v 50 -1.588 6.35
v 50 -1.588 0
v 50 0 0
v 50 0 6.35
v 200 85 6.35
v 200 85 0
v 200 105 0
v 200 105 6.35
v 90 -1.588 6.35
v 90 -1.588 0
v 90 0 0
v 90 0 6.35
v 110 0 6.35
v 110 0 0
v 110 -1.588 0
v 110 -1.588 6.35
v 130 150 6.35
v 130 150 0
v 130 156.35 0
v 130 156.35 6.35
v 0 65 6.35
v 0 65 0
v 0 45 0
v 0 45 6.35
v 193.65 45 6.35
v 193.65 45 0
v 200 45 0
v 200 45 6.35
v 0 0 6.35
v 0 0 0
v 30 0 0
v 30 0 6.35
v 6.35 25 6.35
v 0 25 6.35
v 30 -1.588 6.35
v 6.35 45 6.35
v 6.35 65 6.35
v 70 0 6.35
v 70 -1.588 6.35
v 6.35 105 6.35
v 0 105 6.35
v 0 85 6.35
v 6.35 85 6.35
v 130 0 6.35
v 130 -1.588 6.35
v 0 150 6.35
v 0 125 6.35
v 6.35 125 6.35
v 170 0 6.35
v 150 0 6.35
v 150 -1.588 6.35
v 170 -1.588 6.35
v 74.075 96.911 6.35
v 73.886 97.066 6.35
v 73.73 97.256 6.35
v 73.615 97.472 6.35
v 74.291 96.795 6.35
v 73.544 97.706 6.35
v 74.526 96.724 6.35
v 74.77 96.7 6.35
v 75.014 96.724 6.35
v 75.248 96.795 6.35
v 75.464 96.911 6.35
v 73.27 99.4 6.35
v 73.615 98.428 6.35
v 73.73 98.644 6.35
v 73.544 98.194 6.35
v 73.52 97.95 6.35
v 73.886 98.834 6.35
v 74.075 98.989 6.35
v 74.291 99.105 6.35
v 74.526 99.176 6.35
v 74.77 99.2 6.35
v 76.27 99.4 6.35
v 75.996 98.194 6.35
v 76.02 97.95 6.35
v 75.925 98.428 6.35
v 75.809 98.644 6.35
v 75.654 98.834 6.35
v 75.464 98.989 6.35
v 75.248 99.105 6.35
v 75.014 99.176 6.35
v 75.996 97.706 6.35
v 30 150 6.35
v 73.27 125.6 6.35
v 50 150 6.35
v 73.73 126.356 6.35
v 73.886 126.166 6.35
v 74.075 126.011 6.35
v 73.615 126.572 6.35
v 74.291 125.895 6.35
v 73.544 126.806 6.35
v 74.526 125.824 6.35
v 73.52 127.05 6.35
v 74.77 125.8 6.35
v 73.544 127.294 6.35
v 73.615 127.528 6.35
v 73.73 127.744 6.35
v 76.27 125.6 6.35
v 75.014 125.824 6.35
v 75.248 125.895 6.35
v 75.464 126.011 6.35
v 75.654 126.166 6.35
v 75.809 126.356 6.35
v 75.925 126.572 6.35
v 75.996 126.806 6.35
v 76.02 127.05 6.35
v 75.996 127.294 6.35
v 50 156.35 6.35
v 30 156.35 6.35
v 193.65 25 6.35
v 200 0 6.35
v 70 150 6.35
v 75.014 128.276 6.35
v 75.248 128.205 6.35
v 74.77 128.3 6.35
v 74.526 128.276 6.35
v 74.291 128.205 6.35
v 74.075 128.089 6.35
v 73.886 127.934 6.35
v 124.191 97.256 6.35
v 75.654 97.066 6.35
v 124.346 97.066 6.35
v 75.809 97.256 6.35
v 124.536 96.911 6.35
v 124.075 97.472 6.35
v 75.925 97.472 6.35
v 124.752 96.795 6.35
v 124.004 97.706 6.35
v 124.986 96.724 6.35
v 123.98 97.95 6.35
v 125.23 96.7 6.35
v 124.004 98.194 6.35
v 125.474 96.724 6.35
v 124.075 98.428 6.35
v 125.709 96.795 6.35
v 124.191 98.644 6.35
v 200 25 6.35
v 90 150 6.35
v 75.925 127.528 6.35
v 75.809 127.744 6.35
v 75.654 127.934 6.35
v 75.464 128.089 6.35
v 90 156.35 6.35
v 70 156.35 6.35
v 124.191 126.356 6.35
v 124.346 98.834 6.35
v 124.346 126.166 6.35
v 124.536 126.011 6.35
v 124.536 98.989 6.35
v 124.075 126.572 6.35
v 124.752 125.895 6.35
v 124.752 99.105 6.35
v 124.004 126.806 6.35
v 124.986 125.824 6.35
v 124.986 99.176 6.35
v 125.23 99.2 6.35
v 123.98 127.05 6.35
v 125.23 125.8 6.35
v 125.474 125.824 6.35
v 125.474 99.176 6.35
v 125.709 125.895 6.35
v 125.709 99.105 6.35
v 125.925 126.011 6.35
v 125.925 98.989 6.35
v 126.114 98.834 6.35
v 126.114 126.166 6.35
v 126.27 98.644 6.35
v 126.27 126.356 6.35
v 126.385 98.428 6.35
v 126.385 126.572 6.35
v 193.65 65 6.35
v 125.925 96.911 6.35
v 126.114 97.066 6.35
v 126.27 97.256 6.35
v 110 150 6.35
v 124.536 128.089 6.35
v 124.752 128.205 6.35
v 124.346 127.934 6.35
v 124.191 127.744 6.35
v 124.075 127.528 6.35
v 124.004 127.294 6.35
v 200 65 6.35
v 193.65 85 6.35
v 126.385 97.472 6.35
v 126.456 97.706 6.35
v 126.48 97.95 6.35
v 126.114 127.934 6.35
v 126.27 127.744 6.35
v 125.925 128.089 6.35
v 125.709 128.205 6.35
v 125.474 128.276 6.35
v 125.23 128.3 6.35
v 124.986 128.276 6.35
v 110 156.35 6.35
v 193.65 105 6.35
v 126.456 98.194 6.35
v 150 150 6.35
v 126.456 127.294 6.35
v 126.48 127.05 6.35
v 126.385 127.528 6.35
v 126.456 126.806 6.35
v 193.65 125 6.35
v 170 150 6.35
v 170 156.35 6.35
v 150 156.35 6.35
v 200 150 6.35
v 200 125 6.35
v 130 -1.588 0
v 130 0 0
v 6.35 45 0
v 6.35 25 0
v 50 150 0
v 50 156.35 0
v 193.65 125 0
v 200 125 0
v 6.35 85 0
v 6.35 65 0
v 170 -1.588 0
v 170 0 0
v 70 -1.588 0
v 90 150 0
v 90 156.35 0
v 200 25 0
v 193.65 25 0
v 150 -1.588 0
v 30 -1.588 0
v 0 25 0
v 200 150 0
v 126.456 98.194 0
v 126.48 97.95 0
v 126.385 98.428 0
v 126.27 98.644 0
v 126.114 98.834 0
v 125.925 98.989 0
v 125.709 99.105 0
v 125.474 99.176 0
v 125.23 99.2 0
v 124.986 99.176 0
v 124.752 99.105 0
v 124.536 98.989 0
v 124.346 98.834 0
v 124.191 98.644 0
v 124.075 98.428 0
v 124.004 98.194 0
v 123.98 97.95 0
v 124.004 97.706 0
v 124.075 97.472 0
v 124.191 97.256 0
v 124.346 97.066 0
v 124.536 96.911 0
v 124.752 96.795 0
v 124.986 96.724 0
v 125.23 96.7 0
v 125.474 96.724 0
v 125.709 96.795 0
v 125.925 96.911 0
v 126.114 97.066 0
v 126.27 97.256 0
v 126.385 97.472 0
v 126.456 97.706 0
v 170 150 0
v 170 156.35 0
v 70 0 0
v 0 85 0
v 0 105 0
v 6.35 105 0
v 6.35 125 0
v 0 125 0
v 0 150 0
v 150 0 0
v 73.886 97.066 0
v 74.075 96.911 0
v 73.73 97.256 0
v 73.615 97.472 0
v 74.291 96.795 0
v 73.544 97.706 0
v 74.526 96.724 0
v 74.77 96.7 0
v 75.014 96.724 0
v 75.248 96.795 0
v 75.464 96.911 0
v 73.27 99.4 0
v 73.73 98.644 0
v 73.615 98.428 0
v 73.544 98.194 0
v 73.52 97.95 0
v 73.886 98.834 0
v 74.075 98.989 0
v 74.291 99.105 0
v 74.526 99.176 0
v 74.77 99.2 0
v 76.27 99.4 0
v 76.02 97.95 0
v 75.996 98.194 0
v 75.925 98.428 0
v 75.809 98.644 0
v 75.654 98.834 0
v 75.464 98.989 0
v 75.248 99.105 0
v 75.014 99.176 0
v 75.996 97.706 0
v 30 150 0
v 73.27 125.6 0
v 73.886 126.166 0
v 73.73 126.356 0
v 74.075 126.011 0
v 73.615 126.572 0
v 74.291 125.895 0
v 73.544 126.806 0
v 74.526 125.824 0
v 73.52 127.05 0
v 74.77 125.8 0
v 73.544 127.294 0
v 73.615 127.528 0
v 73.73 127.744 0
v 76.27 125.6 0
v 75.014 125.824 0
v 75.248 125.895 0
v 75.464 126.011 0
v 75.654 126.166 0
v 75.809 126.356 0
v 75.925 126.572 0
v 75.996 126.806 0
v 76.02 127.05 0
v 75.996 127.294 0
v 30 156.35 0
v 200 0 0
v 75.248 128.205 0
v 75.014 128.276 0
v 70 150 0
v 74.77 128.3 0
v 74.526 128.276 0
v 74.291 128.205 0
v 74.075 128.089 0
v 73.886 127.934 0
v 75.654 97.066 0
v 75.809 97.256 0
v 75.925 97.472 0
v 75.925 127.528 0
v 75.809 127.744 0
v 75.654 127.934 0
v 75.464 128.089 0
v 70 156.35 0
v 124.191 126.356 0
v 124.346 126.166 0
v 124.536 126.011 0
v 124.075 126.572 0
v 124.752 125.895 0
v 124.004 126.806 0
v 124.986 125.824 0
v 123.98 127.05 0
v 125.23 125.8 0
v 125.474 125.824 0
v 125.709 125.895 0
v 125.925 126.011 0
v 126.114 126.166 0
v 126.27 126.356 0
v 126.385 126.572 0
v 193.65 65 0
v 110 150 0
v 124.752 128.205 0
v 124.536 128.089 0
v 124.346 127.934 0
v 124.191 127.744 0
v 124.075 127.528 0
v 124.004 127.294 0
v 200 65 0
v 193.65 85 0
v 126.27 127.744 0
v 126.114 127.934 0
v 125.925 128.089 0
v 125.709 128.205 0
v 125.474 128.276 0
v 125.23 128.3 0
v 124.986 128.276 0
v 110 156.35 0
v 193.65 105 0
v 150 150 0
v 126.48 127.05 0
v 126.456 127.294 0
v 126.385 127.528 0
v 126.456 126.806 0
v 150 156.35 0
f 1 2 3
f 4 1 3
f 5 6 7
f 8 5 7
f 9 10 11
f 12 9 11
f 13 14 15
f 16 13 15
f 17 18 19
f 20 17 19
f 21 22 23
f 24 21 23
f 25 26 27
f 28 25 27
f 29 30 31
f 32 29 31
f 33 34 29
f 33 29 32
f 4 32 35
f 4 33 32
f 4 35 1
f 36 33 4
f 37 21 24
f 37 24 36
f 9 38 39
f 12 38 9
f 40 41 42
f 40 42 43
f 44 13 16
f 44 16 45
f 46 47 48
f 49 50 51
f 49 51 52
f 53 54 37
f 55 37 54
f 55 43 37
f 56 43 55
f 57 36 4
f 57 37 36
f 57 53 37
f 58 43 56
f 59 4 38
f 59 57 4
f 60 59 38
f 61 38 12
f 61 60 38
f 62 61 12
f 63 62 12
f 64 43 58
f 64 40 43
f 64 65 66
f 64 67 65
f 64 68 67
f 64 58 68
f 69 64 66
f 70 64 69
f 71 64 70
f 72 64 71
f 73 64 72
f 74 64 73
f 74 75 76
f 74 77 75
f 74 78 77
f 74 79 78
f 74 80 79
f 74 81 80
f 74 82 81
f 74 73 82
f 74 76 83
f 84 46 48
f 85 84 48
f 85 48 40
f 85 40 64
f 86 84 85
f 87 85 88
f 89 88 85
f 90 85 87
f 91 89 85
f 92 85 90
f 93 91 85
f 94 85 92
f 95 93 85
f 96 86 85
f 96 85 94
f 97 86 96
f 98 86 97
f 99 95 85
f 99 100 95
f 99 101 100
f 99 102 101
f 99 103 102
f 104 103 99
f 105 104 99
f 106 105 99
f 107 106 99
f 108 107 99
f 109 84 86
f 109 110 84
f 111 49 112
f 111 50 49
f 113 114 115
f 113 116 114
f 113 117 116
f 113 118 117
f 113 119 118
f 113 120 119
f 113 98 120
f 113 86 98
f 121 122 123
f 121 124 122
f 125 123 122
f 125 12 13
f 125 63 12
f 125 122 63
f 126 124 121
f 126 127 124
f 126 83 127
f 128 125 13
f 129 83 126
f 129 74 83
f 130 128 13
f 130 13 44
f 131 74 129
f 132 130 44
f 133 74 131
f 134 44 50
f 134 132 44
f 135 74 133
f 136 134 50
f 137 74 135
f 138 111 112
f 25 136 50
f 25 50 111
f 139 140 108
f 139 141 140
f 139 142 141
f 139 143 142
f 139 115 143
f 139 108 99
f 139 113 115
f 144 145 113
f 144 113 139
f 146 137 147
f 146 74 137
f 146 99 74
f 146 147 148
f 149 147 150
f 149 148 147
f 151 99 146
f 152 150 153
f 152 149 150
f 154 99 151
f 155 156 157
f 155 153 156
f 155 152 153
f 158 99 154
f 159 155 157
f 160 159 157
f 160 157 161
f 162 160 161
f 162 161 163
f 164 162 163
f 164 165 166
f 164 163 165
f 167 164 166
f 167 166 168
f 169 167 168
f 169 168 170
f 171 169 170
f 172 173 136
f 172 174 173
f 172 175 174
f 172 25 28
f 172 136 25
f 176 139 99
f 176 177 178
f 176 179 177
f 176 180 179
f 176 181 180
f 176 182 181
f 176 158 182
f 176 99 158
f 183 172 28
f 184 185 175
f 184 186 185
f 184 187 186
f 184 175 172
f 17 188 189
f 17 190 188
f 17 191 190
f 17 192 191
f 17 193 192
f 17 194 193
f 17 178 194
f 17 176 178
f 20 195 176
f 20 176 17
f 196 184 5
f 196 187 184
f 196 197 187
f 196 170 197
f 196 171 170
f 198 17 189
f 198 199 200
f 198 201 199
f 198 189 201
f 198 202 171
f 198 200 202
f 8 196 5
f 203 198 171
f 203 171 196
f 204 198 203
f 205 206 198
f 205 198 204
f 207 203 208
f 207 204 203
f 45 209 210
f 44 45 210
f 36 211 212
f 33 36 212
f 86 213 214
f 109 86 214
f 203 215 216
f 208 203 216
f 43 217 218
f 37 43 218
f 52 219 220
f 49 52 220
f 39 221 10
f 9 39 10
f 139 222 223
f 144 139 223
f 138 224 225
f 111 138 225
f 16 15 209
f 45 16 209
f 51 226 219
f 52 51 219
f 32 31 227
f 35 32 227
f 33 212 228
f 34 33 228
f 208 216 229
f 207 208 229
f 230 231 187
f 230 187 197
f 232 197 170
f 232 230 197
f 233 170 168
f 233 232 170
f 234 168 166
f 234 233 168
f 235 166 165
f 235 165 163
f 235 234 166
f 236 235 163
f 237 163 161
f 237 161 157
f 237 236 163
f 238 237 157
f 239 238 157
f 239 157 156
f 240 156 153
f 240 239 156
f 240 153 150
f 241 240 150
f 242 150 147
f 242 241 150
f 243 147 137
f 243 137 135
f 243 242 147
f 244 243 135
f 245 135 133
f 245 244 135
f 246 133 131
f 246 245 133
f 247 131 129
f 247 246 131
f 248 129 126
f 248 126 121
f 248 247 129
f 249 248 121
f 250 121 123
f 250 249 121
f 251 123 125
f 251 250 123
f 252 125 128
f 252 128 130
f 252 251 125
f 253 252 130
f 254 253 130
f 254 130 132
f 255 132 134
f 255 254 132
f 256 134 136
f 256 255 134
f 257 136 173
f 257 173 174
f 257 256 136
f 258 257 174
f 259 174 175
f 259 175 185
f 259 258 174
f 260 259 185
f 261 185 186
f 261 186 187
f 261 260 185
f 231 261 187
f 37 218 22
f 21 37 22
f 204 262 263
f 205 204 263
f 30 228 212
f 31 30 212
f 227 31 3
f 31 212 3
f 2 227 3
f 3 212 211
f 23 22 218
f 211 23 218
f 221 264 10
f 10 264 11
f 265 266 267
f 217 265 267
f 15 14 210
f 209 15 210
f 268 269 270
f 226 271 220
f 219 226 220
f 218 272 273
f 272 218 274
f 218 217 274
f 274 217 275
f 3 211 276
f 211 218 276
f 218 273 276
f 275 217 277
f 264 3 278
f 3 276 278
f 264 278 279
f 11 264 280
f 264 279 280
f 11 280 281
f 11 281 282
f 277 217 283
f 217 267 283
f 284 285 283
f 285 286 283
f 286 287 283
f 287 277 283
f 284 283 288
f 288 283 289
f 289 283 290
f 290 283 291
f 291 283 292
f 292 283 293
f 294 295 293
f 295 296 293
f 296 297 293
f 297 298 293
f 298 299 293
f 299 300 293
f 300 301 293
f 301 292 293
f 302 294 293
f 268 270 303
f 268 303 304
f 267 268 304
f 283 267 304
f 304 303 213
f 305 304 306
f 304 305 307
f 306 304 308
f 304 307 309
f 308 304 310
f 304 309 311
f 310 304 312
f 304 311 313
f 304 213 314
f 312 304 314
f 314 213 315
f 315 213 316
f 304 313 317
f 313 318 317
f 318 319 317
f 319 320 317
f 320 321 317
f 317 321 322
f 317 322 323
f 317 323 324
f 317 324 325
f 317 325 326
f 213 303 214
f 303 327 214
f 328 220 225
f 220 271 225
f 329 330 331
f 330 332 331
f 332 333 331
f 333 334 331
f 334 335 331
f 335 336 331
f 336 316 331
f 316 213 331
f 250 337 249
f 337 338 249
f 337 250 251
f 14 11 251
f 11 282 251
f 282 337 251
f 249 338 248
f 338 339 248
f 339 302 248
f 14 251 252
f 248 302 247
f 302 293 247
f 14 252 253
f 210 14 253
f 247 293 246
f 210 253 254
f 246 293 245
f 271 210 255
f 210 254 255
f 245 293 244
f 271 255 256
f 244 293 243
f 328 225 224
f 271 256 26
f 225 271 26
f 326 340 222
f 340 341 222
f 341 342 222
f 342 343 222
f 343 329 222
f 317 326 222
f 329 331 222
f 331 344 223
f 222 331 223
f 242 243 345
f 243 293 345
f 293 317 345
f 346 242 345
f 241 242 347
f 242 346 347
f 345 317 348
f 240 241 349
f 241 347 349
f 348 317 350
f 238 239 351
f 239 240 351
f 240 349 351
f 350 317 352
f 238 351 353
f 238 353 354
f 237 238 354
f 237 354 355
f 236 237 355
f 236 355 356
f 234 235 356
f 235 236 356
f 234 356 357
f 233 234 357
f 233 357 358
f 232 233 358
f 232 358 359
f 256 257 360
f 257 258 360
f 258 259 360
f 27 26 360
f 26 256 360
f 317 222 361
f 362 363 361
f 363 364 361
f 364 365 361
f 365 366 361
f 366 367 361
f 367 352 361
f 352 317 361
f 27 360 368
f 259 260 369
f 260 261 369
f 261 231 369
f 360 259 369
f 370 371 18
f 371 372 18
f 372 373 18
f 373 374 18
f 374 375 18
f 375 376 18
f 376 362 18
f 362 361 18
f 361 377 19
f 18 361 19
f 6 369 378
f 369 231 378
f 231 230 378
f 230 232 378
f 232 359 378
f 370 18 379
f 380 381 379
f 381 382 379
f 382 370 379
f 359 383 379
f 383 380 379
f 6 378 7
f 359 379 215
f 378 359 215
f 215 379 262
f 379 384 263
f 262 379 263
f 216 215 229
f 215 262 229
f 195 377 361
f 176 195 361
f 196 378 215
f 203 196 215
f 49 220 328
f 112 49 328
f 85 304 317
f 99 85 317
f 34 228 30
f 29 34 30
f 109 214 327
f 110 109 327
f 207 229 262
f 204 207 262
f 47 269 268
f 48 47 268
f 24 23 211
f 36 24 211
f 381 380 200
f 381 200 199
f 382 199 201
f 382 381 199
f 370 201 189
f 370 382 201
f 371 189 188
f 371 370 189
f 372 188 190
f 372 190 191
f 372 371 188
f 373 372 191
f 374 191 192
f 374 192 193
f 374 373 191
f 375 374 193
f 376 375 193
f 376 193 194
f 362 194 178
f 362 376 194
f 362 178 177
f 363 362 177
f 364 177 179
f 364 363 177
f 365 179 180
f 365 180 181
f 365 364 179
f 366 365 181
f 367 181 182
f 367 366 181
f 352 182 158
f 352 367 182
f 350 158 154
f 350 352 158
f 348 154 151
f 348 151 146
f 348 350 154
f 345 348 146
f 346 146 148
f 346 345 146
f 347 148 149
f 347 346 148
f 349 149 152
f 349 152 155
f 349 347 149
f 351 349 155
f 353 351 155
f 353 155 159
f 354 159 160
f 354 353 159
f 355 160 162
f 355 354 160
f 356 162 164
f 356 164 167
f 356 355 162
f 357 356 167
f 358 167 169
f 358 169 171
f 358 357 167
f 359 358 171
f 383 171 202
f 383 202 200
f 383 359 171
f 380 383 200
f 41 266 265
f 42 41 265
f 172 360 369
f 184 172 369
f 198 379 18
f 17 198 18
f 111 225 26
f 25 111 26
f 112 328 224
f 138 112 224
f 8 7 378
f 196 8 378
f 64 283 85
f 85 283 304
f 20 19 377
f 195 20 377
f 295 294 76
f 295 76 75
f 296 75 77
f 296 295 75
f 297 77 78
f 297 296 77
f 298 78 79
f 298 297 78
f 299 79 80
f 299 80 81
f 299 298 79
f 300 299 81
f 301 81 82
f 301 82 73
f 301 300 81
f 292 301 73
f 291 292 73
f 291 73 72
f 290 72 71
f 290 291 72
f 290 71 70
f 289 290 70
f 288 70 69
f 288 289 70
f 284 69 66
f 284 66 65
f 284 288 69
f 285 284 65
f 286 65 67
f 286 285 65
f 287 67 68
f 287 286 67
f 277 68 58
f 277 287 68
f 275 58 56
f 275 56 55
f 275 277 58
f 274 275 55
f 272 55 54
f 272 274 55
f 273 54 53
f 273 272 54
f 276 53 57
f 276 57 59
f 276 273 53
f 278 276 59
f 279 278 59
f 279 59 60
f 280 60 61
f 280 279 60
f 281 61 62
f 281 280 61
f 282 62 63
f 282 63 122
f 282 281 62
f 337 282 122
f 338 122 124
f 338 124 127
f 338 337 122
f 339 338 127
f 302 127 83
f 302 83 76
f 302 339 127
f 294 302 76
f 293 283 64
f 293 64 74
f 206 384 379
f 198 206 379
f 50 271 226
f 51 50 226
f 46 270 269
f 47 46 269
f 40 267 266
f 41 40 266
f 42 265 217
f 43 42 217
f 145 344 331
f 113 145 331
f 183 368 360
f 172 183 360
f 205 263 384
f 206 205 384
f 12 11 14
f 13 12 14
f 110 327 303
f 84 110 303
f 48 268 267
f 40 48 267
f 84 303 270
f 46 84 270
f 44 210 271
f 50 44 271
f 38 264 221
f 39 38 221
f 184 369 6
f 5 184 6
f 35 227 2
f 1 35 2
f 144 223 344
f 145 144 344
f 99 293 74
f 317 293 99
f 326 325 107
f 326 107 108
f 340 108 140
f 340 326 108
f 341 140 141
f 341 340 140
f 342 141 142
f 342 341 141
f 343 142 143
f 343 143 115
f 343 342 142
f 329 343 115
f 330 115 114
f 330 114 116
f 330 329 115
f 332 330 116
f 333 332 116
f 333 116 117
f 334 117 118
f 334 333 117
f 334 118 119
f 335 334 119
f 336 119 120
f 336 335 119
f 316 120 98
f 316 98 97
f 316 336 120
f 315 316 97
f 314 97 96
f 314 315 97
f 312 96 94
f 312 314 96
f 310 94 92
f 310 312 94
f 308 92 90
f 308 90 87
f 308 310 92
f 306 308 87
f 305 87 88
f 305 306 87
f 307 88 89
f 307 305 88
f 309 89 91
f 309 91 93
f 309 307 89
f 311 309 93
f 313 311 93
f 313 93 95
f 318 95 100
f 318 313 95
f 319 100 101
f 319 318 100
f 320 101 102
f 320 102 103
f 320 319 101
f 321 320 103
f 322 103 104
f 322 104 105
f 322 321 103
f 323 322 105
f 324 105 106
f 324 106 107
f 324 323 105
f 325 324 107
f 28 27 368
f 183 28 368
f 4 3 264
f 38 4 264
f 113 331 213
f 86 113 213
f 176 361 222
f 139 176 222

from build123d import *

# Parameters (mm, degrees)
SKETCH1_R           = 1.25
SKETCH1_W           = 3
SKETCH1_H           = 26.2
BOSS_EXTRUDE4_DEPTH = 6.35


with BuildPart() as part:
    # Sketch1 → Boss-Extrude4 (new body)
    with BuildSketch(Plane.XY):
        Polygon((0, 25), (0, 0), (30, 0), (30, -1.5875), (50, -1.5875), (50, 0), (70, 0), (70, -1.5875), (90, -1.5875), (90, 0), (110, 0), (110, -1.5875), (130, -1.5875), (130, 0), (150, 0), (150, -1.5875), (170, -1.5875), (170, 0), (200, 0), (200, 25), (193.65, 25), (193.65, 45), (200, 45), (200, 65), (193.65, 65), (193.65, 85), (200, 85), (200, 105), (193.65, 105), (193.65, 125), (200, 125), (200, 150), (170, 150), (170, 156.35), (150, 156.35), (150, 150), (130, 150), (130, 156.35), (110, 156.35), (110, 150), (90, 150), (90, 156.35), (70, 156.35), (70, 150), (50, 150), (50, 156.35), (30, 156.35), (30, 150), (0, 150), (0, 125), (6.35, 125), (6.35, 105), (0, 105), (0, 85), (6.35, 85), (6.35, 65), (0, 65), (0, 45), (6.35, 45), (6.35, 25), align=None)
        with Locations((74.769797365, 97.95)):
            Circle(SKETCH1_R, mode=Mode.SUBTRACT)
        with Locations((74.769797365, 112.5)):
            Rectangle(SKETCH1_W, SKETCH1_H, mode=Mode.SUBTRACT)
        with Locations((74.769797365, 127.05)):
            Circle(SKETCH1_R, mode=Mode.SUBTRACT)
        with Locations((125.230202635, 97.95)):
            Circle(SKETCH1_R, mode=Mode.SUBTRACT)
        with Locations((125.230202635, 127.05)):
            Circle(SKETCH1_R, mode=Mode.SUBTRACT)
    extrude(amount=BOSS_EXTRUDE4_DEPTH)


solid = part.part
